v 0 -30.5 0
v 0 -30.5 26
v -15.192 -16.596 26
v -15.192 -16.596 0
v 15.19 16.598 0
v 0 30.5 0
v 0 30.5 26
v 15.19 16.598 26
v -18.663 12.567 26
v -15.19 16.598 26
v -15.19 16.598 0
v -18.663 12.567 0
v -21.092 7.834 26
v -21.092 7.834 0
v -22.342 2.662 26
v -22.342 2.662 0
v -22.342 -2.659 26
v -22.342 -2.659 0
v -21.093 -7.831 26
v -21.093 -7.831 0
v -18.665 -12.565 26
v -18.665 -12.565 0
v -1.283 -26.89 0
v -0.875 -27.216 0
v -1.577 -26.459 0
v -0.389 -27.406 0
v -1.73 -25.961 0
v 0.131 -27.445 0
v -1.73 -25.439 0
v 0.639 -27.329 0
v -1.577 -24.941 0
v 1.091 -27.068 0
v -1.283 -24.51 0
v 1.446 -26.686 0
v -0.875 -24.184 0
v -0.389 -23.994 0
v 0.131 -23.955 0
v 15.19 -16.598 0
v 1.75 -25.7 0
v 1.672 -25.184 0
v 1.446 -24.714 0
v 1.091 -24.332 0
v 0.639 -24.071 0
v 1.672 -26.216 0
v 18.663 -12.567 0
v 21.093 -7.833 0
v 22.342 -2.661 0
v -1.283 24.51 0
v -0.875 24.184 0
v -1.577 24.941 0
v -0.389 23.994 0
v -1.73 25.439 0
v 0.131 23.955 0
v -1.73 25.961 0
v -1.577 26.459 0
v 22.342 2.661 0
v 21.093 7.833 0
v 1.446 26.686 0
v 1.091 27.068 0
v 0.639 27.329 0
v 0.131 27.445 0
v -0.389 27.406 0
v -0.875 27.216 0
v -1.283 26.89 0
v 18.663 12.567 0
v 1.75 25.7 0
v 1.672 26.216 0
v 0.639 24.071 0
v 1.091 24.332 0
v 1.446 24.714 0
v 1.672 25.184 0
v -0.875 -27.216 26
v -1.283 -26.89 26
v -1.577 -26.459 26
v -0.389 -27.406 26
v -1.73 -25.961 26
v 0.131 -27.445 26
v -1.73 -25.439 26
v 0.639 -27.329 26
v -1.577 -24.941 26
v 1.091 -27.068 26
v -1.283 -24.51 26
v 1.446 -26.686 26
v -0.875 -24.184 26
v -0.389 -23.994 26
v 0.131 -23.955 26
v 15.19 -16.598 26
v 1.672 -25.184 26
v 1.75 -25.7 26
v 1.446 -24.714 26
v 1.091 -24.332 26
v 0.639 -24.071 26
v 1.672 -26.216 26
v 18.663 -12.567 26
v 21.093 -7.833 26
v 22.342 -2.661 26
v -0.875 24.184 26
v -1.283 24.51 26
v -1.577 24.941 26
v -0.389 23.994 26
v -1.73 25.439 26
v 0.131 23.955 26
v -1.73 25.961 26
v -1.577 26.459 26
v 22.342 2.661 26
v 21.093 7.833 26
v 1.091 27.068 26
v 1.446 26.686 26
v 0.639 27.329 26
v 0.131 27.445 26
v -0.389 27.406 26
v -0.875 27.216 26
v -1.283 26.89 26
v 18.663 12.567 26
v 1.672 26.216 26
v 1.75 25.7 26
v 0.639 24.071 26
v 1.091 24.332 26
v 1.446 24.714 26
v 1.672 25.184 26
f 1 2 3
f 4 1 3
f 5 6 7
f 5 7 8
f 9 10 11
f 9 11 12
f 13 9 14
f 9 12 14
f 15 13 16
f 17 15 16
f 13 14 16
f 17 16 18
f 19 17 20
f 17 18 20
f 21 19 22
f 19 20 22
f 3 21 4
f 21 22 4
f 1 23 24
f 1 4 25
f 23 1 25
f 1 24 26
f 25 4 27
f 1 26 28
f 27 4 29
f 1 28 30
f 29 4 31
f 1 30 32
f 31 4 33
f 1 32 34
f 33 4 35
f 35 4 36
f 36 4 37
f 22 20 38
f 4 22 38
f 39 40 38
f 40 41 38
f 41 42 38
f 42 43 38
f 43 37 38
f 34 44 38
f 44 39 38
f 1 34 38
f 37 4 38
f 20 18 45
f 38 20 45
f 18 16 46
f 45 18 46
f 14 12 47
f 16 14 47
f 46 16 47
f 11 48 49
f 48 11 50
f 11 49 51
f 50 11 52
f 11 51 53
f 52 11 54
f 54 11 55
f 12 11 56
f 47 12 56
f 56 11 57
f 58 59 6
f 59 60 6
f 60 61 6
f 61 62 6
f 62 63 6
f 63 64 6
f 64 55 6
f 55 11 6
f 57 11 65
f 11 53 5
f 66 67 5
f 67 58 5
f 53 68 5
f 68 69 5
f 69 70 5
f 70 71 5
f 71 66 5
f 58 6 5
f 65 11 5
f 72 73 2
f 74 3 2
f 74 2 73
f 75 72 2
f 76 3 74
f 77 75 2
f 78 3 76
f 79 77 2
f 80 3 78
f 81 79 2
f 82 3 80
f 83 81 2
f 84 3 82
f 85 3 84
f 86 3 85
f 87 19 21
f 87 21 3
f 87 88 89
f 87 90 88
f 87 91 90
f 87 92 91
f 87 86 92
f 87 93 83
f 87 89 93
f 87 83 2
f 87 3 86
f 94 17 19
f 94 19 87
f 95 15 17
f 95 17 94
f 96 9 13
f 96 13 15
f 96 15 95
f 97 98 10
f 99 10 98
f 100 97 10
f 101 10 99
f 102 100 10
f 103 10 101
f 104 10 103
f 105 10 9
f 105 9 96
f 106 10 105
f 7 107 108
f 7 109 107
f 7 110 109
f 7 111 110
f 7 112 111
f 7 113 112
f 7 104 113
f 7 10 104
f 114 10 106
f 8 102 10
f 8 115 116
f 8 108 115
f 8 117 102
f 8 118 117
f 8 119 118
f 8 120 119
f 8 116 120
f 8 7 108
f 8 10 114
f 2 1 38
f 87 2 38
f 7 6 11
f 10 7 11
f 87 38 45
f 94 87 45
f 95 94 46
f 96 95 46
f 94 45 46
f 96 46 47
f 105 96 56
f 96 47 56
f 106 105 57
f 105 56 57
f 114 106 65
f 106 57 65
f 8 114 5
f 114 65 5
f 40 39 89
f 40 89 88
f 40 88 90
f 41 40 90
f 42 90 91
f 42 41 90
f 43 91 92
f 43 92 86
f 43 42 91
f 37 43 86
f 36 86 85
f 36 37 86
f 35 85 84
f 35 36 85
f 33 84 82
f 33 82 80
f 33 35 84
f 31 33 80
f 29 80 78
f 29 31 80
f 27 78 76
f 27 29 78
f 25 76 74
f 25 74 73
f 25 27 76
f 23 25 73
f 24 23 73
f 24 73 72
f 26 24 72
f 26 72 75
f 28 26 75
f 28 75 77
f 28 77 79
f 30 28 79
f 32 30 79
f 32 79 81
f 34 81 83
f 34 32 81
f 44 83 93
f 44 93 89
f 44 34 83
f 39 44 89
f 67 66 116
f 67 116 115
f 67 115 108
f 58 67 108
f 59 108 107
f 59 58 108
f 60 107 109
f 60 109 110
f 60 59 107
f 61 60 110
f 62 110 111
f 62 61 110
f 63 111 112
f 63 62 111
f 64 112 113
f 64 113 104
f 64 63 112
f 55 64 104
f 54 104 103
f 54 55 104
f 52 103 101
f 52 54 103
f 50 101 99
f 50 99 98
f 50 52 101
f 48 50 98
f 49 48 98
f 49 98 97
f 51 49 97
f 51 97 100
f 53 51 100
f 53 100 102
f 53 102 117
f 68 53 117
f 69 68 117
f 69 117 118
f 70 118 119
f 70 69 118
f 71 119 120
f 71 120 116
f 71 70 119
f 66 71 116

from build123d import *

# Parameters (mm, degrees)
SKETCH_R  = 1.75
PAD_DEPTH = 26


with BuildPart() as part:
    # Sketch → Pad (new body)
    with BuildSketch(Plane.XY):
        with BuildLine():
            Line((0, 30.499996), (-15.190274, 16.598361))
            ThreePointArc((-15.190274, 16.598361), (-22.5, 0.001507), (-15.192497, -16.596326))
            Line((0, -30.500004), (-15.192497, -16.596326))
            Line((0, -30.500004), (15.190268, -16.598366))
            ThreePointArc((15.190268, -16.598366), (22.5, -3e-06), (15.190272, 16.598363))
            Line((0, 30.499996), (15.190272, 16.598363))
        make_face()
        with Locations((0, 25.7)):
            Circle(SKETCH_R, mode=Mode.SUBTRACT)
        with Locations((0, -25.7)):
            Circle(SKETCH_R, mode=Mode.SUBTRACT)
    extrude(amount=PAD_DEPTH)


solid = part.part
